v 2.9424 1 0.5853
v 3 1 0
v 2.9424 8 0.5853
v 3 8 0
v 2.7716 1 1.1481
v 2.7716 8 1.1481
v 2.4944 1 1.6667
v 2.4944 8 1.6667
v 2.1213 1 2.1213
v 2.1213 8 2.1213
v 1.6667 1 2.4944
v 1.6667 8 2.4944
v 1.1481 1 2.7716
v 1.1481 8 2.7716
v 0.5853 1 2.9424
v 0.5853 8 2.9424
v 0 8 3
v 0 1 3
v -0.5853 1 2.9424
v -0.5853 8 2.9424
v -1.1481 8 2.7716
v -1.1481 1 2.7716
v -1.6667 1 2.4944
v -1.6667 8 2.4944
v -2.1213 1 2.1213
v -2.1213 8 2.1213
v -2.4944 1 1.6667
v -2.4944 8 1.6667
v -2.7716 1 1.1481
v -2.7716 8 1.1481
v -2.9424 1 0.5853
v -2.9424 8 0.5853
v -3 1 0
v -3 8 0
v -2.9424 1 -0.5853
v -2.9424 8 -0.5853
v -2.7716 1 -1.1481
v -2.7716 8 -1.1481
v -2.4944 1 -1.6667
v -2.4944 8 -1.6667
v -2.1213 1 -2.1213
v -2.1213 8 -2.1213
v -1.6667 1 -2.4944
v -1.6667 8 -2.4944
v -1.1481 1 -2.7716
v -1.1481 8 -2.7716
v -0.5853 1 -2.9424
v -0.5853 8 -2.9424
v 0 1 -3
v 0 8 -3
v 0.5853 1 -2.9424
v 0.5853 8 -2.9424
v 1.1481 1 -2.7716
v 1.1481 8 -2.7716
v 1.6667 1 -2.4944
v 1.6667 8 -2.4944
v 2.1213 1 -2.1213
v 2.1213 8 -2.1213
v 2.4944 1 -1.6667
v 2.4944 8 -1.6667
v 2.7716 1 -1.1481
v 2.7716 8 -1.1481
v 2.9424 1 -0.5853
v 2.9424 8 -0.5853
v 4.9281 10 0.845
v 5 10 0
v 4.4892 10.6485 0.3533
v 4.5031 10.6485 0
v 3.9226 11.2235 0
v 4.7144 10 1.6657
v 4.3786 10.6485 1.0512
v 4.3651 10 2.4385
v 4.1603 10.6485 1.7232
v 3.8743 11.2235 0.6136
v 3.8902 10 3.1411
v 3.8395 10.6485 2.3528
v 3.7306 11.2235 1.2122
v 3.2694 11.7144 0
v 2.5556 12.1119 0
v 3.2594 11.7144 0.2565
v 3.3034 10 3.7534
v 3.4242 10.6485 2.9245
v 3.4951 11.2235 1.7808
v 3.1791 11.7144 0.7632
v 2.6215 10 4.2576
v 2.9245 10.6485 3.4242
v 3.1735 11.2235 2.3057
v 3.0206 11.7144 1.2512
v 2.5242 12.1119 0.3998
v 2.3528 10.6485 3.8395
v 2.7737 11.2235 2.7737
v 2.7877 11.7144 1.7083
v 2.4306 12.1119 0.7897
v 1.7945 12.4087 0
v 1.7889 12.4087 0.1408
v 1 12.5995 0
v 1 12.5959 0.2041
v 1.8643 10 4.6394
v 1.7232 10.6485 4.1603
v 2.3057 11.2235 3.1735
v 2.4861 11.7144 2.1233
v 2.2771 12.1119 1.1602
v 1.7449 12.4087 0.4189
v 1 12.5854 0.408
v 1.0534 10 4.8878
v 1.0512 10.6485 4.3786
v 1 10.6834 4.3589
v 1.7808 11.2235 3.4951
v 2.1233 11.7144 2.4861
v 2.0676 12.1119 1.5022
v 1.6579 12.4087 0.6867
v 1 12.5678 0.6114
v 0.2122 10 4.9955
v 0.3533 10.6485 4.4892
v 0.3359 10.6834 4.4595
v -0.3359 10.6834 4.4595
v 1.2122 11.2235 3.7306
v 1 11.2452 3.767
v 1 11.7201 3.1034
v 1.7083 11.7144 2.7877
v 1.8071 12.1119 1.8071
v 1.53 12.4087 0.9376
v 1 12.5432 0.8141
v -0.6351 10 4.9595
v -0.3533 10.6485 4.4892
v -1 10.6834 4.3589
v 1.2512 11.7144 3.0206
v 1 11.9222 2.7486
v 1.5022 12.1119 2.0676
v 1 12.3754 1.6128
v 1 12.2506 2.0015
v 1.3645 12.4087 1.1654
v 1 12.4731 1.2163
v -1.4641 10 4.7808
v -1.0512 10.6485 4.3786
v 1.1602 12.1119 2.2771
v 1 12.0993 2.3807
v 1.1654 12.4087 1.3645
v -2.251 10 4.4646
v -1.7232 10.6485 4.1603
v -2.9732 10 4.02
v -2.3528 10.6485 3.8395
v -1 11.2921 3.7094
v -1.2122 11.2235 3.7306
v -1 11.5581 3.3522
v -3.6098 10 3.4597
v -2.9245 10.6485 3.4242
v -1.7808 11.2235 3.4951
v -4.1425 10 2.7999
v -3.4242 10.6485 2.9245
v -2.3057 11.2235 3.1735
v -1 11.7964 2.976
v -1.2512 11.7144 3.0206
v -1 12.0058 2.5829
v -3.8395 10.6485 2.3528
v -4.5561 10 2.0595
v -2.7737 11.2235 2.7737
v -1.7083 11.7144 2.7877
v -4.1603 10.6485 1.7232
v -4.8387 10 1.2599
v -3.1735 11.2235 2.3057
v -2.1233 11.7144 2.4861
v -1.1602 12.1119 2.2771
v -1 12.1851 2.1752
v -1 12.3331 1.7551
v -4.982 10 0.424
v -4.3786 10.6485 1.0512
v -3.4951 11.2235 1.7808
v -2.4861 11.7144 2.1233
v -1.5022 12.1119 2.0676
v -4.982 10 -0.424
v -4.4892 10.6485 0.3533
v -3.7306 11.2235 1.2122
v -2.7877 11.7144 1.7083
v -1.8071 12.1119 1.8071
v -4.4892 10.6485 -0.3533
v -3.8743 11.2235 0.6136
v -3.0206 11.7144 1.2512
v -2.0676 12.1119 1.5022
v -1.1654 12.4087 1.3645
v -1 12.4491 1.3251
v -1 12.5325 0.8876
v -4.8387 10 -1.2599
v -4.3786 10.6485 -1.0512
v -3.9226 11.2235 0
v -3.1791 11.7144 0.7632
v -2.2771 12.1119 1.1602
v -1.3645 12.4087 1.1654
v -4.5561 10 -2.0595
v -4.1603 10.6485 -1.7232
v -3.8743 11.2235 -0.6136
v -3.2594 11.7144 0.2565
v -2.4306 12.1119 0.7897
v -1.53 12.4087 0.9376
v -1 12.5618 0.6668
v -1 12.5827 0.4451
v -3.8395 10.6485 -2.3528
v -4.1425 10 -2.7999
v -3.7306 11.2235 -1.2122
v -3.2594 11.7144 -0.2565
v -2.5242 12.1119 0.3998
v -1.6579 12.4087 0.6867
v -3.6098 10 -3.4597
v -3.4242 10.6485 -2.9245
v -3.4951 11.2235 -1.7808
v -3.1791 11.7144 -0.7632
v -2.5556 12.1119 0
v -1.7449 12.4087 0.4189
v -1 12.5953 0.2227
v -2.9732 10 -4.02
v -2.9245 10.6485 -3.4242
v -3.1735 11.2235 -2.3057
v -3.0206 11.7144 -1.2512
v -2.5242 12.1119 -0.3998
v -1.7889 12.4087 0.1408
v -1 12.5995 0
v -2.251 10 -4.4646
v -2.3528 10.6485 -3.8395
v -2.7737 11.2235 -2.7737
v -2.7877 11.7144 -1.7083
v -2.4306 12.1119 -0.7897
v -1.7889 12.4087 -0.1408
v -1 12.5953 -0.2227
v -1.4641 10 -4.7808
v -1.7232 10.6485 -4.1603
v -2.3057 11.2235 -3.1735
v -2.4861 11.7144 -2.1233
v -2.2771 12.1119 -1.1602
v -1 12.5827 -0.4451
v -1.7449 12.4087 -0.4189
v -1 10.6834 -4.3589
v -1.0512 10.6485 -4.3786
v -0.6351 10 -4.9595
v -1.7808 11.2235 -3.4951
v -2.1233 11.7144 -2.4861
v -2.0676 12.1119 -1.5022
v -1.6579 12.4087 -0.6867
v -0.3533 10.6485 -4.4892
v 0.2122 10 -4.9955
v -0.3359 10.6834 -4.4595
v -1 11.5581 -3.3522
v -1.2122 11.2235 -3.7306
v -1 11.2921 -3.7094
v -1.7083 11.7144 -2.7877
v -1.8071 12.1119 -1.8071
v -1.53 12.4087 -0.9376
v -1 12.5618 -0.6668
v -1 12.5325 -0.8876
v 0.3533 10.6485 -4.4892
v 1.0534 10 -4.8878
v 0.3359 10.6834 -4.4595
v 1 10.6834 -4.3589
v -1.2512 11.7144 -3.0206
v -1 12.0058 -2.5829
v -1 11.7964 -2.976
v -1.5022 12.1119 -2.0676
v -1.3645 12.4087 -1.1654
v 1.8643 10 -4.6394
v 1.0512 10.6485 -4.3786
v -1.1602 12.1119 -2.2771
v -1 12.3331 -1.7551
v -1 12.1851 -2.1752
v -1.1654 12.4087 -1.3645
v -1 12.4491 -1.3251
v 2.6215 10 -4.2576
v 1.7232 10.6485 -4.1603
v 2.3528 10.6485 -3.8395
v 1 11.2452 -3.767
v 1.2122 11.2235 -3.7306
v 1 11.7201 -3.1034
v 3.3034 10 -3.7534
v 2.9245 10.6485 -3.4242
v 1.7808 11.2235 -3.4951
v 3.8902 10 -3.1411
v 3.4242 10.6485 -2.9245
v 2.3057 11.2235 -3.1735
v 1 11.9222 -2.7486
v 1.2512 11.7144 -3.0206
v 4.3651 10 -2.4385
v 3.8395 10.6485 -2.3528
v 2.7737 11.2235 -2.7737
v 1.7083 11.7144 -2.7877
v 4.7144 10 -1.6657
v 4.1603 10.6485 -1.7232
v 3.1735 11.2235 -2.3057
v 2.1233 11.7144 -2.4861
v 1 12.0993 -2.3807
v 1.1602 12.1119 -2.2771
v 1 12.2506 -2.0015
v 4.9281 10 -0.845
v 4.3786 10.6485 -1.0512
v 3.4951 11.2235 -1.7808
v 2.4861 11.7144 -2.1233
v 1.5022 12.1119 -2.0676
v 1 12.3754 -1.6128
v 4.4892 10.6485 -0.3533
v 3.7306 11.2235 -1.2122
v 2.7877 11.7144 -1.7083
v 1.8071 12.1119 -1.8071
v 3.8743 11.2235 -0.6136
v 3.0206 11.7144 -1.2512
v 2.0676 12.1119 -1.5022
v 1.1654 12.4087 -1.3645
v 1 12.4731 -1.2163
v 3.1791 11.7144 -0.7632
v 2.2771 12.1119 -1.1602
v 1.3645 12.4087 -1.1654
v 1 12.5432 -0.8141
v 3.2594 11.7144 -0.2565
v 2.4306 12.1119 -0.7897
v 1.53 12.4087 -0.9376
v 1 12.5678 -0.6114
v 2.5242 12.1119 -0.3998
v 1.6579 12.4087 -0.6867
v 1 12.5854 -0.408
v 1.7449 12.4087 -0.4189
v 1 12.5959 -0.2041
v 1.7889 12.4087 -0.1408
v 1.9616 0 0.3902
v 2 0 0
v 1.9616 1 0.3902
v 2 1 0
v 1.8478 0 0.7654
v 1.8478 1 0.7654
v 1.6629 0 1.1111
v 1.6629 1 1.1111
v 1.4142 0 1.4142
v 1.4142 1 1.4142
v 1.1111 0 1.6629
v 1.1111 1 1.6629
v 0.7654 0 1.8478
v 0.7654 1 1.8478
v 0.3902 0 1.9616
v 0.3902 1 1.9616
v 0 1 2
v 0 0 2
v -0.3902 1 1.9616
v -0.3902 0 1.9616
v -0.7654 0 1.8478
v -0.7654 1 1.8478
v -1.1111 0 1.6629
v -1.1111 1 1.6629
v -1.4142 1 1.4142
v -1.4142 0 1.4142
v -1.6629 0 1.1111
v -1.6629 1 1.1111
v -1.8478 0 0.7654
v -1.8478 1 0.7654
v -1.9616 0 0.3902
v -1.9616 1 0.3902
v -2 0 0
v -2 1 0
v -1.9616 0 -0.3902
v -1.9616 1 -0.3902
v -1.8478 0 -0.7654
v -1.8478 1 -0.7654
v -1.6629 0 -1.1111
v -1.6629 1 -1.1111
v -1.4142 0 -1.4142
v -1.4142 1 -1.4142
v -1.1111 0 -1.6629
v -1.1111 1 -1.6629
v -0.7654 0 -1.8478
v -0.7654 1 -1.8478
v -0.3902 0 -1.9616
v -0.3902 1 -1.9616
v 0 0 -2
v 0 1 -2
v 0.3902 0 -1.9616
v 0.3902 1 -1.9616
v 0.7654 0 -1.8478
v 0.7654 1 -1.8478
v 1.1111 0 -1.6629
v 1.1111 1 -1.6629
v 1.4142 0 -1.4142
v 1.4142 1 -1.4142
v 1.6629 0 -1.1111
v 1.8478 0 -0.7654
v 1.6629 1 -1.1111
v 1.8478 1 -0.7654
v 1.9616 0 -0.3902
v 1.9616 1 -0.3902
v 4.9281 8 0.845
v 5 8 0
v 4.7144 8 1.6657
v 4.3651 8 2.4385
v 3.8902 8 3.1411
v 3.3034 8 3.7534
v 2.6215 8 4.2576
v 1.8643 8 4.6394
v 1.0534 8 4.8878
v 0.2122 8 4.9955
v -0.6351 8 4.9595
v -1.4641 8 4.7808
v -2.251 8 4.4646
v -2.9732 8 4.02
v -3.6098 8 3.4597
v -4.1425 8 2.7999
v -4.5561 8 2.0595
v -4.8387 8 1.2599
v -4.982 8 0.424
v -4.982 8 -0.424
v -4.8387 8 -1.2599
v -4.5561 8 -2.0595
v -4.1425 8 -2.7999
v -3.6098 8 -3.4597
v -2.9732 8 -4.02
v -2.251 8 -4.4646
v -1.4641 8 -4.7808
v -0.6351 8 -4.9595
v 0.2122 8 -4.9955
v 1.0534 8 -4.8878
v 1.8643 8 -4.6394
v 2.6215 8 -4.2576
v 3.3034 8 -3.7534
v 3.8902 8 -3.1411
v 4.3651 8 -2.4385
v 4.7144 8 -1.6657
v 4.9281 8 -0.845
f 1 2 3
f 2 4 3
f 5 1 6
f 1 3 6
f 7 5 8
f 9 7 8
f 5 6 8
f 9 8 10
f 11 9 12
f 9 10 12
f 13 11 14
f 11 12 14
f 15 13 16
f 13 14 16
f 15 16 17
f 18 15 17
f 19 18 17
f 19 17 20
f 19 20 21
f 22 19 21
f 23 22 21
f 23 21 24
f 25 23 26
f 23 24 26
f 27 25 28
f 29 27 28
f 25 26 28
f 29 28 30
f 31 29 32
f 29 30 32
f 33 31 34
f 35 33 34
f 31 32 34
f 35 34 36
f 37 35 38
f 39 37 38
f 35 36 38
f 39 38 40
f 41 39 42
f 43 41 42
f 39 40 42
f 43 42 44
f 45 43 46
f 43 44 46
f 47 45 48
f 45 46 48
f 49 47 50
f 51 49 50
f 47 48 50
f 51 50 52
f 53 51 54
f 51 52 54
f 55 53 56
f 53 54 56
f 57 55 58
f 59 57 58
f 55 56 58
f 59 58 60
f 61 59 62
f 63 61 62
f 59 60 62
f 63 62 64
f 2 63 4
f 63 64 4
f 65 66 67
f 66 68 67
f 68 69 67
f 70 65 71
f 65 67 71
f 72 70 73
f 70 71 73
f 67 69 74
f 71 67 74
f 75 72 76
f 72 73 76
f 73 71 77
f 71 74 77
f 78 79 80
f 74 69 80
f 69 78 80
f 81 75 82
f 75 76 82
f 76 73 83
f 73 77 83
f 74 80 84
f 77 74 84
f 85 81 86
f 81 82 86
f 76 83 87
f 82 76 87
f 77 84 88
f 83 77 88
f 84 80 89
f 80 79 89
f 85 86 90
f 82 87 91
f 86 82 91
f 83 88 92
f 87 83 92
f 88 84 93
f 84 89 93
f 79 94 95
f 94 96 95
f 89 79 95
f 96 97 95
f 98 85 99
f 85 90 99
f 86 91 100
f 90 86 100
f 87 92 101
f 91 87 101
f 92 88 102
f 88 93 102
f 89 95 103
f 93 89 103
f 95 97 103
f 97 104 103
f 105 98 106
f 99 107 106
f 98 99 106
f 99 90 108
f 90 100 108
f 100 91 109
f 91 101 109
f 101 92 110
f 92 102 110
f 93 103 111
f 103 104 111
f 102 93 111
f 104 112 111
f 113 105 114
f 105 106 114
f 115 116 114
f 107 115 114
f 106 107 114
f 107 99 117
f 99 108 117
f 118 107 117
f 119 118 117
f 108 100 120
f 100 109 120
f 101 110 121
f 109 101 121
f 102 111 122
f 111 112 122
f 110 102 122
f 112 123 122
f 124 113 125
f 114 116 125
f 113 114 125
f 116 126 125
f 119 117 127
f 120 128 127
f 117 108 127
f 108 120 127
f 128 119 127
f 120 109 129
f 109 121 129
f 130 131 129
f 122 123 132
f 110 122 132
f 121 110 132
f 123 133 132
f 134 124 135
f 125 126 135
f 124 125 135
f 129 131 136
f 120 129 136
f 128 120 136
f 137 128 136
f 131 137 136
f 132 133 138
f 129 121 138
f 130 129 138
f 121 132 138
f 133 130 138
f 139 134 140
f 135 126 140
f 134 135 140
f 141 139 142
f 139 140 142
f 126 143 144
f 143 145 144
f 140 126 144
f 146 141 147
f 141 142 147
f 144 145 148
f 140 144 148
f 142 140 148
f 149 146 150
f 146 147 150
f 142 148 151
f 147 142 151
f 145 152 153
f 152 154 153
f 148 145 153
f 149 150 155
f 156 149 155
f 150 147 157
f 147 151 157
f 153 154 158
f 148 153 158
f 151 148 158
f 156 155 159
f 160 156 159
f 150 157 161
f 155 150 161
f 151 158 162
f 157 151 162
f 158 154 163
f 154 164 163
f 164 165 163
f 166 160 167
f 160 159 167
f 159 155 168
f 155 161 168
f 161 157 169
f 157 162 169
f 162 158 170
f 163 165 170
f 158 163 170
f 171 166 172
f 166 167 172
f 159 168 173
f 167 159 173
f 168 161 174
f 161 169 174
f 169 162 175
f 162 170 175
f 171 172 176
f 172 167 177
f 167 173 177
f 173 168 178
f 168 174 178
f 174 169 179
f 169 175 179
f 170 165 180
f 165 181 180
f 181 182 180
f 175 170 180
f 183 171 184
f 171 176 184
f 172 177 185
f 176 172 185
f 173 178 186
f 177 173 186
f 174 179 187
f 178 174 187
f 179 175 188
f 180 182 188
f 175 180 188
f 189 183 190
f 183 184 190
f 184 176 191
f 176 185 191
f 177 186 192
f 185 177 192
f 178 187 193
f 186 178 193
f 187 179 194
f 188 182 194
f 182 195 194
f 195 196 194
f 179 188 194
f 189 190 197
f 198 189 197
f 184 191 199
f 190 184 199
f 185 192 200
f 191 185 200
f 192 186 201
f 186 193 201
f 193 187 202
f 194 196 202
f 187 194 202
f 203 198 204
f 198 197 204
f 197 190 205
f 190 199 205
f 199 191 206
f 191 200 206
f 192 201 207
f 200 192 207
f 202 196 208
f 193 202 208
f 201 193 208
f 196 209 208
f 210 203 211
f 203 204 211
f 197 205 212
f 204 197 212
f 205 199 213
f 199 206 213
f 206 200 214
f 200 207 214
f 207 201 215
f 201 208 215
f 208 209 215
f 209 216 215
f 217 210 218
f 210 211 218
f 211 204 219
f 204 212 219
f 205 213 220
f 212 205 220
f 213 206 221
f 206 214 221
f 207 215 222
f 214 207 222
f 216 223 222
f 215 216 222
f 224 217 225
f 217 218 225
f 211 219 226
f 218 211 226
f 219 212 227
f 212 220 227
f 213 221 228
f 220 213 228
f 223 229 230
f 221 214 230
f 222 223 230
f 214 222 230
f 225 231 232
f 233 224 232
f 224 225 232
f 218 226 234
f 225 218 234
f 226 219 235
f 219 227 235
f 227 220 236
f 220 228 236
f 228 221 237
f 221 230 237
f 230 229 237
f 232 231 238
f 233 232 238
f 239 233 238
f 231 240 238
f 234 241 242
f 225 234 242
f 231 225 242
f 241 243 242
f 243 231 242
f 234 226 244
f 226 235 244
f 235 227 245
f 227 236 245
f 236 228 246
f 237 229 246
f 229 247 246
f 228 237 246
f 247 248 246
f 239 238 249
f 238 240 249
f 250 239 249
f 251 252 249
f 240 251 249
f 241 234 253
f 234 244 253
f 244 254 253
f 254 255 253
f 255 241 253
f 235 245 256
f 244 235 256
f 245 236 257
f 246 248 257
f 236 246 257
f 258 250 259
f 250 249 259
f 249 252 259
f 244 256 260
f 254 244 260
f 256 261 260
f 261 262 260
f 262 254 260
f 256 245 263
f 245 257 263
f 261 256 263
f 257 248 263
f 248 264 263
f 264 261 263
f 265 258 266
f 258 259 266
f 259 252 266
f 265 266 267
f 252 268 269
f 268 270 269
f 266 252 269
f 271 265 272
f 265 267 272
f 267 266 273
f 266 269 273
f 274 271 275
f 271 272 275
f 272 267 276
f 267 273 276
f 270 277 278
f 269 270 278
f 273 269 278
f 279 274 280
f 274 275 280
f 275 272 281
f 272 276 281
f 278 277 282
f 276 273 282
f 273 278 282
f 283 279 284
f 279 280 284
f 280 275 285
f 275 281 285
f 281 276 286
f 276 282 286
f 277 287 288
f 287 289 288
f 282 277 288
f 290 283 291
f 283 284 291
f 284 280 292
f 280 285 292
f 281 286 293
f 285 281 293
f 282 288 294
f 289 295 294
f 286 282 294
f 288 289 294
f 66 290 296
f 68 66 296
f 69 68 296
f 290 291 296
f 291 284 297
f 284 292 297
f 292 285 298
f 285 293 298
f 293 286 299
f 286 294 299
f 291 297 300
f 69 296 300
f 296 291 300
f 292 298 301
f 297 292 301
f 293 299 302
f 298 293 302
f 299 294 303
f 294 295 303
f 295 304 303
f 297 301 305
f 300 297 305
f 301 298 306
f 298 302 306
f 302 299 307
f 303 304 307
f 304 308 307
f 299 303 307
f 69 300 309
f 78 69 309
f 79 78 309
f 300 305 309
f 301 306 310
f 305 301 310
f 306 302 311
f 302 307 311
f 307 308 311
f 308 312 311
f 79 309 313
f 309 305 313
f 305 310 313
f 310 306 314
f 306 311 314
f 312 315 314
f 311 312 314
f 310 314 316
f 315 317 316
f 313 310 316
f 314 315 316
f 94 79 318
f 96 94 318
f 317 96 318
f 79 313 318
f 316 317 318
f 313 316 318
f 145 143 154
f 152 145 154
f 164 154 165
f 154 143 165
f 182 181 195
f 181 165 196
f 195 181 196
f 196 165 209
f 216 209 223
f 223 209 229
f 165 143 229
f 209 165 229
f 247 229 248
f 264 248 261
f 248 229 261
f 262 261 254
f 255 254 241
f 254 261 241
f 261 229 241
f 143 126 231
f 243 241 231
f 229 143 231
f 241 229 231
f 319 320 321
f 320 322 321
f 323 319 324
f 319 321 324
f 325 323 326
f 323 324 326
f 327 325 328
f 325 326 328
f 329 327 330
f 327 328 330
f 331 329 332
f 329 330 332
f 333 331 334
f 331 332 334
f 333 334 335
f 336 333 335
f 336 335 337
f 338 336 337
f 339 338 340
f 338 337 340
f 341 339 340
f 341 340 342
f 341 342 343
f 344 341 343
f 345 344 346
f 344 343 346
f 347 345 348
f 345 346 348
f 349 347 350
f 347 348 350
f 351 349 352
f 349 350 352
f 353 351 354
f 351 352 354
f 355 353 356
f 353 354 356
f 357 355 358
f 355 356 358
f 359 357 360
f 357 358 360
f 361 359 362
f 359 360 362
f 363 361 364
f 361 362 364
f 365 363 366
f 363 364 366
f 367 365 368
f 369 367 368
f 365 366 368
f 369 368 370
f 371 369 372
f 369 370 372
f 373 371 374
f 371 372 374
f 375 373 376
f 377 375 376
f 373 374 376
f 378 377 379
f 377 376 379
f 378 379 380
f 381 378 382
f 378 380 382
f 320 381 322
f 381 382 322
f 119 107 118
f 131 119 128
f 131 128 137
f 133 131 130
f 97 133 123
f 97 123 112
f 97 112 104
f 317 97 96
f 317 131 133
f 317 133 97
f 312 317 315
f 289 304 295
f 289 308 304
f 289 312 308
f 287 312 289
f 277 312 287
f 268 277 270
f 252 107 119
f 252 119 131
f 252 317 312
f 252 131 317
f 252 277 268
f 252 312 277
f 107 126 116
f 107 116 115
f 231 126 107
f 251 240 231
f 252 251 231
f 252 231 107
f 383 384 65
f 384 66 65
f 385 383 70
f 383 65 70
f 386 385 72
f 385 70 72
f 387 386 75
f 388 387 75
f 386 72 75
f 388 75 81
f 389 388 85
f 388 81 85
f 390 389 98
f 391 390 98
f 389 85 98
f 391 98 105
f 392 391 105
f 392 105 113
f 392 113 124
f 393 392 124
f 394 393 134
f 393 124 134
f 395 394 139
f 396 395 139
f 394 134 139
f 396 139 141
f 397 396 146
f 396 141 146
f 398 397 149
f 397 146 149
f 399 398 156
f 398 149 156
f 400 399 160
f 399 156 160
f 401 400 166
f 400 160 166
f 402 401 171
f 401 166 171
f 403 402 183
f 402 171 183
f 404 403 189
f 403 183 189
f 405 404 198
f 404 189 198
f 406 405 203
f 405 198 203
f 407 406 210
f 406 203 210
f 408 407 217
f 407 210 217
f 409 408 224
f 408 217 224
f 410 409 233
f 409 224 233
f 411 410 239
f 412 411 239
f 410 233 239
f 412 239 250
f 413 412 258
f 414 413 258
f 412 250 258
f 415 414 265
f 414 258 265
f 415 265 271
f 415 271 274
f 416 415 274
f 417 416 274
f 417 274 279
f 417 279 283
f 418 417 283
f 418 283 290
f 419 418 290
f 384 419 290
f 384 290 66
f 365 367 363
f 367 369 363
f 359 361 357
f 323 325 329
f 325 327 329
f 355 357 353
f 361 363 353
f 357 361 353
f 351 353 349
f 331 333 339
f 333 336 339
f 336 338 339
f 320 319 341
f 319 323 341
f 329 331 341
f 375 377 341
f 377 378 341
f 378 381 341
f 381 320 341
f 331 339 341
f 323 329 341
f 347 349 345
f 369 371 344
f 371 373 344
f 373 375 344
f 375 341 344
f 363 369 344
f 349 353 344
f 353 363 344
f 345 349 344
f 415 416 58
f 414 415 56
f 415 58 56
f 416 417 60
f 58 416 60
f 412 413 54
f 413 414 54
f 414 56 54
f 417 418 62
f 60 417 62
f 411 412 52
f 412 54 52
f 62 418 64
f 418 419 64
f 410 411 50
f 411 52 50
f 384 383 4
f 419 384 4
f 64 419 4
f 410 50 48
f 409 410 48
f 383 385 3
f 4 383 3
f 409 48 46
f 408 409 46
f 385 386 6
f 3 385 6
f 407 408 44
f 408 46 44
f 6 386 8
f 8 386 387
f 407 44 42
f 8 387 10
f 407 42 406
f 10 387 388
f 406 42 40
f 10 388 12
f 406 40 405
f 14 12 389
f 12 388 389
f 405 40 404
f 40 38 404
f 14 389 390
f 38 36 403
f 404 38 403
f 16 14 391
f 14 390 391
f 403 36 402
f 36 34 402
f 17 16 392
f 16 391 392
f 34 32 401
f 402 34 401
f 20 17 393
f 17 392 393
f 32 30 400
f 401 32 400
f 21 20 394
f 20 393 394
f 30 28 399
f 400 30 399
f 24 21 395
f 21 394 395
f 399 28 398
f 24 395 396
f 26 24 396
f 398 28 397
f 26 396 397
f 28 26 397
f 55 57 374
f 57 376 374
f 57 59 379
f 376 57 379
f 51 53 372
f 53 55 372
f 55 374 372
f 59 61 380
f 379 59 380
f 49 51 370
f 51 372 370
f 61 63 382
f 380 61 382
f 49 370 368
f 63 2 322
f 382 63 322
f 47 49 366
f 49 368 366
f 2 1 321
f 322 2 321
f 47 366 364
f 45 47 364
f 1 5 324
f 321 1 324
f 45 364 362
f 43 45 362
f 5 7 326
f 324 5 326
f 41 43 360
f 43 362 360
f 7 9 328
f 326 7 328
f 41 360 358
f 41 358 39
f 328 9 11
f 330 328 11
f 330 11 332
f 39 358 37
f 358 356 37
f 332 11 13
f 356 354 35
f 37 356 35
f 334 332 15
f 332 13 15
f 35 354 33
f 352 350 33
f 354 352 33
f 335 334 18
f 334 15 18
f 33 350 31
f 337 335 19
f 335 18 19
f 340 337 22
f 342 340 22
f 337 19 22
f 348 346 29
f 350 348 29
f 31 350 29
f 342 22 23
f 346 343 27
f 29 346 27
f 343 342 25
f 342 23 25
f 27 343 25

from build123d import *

# Parameters (mm, degrees)
SKETCH2_W               = 2
SKETCH2_H               = 3
CUT_EXTRUDE1_DEPTH      = 6
CUT_EXTRUDE1_DEPTH_BACK = 6


with BuildPart() as part:
    # Sketch1 → Revolve1 (revolve)
    with BuildSketch(Plane.XY):
        with BuildLine():
            Line((0, 12.68337521), (0, 0))
            Line((0, 0), (2, 0))
            Line((2, 0), (2, 1))
            Line((2, 1), (3, 1))
            Line((3, 1), (3, 8))
            Line((3, 8), (5, 8))
            Line((5, 8), (5, 10))
            ThreePointArc((5, 10), (2.837274331, 11.970139283), (0, 12.68337521))
        make_face()
    revolve(axis=Axis((0, 15.248921205, 0), (0, -1, 0)))

    # Sketch2 → Cut-Extrude1 (cut, two sides)
    with BuildSketch(Plane.XY) as cut_extrude1_sk:
        with Locations((0, 12.18337521)):
            Rectangle(SKETCH2_W, SKETCH2_H)
    extrude(amount=CUT_EXTRUDE1_DEPTH, mode=Mode.SUBTRACT)
    extrude(cut_extrude1_sk.sketch, amount=-CUT_EXTRUDE1_DEPTH_BACK, mode=Mode.SUBTRACT)


solid = part.part
